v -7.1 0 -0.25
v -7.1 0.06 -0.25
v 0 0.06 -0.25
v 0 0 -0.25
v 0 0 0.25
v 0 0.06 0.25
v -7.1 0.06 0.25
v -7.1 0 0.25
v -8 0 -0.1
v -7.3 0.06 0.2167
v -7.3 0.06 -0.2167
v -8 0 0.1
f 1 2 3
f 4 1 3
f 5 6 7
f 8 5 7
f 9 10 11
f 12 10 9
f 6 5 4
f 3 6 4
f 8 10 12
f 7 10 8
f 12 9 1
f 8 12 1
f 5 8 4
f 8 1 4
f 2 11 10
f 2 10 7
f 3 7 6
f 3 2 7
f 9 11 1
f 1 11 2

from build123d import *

# Parameters (mm, degrees)
BOSS_EXTRUDE1_DEPTH = 0.06
CUT_EXTRUDE3_DEPTH  = 9.09728967
CUT_EXTRUDE4_DEPTH  = 9.09728967
CUT_EXTRUDE5_DEPTH  = 2.5


with BuildPart() as part:
    # Sketch1 → Boss-Extrude1 (new body)
    with BuildSketch(Plane(origin=(0, 0, 0), x_dir=(1, 0, 0), z_dir=(0, 1, 0))):
        with BuildLine():
            ThreePointArc((-0.362264151, -0.932075472), (-0.747576714, -0.664175471), (-0.968245837, -0.25))
            Line((-0.968245837, -0.25), (-4, -0.25))
            Line((-4, -0.25), (-0.362264151, -0.932075472))
        make_face()
        with BuildLine():
            ThreePointArc((-0.968245837, 0.25), (-0.747576714, 0.664175471), (-0.362264151, 0.932075472))
            Line((-0.362264151, 0.932075472), (-4, 0.25))
            Line((-4, 0.25), (-0.968245837, 0.25))
        make_face()
        with BuildLine():
            ThreePointArc((-0.968245837, -0.25), (-1, 0), (-0.968245837, 0.25))
            Line((-0.968245837, 0.25), (-4, 0.25))
            Line((-4, 0.25), (-8, 0.25))
            Line((-8, 0.25), (-8, -0.25))
            Line((-8, -0.25), (-4, -0.25))
            Line((-4, -0.25), (-0.968245837, -0.25))
        make_face()
        with BuildLine():
            Line((0, -1), (0, -0.25))
            Line((0, -0.25), (-0.968245837, -0.25))
            ThreePointArc((-0.968245837, -0.25), (-0.747576714, -0.664175471), (-0.362264151, -0.932075472))
            Line((-0.362264151, -0.932075472), (0, -1))
        make_face()
        with BuildLine():
            Line((0, 0.25), (0, 1))
            Line((0, 1), (-0.362264151, 0.932075472))
            ThreePointArc((-0.362264151, 0.932075472), (-0.747576714, 0.664175471), (-0.968245837, 0.25))
            Line((-0.968245837, 0.25), (0, 0.25))
        make_face()
        with BuildLine():
            Line((0, -0.25), (0, 0.25))
            Line((0, 0.25), (-0.968245837, 0.25))
            ThreePointArc((-0.968245837, 0.25), (-1, 0), (-0.968245837, -0.25))
            Line((-0.968245837, -0.25), (0, -0.25))
        make_face()
    extrude(amount=BOSS_EXTRUDE1_DEPTH)

    # Sketch5 → Cut-Extrude3 (cut, through all)
    with BuildSketch(Plane.XY.offset(0.25)):
        Polygon((-8, 0), (-8, 0.06), (-7.3, 0.06), align=None)
    extrude(amount=-CUT_EXTRUDE3_DEPTH, mode=Mode.SUBTRACT)

    # 3DSketch1 → Cut-Extrude4 (cut, through all)
    with BuildSketch(Plane(origin=(-8, 0.06, 0.25), x_dir=(0.8741572761215383, 0, -0.4856429311786313), z_dir=(0, -1, 0))):
        Polygon((0, 0), (0.07284644, -0.131123591), (0.786741549, 0.437078638), align=None)
        Polygon((1.029563014, 0), (0.242821466, -0.437078638), (0.169975026, -0.305955047), align=None)
    extrude(amount=CUT_EXTRUDE4_DEPTH, mode=Mode.SUBTRACT)

    # Sketch6 → Cut-Extrude5 (cut)
    with BuildSketch(Plane(origin=(0, 0.06, 0), x_dir=(1, 0, 0), z_dir=(0, 1, 0))):
        Polygon((0, 1), (-4, 0.25), (0, 0.25), align=None)
        Polygon((0, -0.25), (-4, -0.25), (0, -1), align=None)
    extrude(amount=-CUT_EXTRUDE5_DEPTH, mode=Mode.SUBTRACT)


solid = part.part
